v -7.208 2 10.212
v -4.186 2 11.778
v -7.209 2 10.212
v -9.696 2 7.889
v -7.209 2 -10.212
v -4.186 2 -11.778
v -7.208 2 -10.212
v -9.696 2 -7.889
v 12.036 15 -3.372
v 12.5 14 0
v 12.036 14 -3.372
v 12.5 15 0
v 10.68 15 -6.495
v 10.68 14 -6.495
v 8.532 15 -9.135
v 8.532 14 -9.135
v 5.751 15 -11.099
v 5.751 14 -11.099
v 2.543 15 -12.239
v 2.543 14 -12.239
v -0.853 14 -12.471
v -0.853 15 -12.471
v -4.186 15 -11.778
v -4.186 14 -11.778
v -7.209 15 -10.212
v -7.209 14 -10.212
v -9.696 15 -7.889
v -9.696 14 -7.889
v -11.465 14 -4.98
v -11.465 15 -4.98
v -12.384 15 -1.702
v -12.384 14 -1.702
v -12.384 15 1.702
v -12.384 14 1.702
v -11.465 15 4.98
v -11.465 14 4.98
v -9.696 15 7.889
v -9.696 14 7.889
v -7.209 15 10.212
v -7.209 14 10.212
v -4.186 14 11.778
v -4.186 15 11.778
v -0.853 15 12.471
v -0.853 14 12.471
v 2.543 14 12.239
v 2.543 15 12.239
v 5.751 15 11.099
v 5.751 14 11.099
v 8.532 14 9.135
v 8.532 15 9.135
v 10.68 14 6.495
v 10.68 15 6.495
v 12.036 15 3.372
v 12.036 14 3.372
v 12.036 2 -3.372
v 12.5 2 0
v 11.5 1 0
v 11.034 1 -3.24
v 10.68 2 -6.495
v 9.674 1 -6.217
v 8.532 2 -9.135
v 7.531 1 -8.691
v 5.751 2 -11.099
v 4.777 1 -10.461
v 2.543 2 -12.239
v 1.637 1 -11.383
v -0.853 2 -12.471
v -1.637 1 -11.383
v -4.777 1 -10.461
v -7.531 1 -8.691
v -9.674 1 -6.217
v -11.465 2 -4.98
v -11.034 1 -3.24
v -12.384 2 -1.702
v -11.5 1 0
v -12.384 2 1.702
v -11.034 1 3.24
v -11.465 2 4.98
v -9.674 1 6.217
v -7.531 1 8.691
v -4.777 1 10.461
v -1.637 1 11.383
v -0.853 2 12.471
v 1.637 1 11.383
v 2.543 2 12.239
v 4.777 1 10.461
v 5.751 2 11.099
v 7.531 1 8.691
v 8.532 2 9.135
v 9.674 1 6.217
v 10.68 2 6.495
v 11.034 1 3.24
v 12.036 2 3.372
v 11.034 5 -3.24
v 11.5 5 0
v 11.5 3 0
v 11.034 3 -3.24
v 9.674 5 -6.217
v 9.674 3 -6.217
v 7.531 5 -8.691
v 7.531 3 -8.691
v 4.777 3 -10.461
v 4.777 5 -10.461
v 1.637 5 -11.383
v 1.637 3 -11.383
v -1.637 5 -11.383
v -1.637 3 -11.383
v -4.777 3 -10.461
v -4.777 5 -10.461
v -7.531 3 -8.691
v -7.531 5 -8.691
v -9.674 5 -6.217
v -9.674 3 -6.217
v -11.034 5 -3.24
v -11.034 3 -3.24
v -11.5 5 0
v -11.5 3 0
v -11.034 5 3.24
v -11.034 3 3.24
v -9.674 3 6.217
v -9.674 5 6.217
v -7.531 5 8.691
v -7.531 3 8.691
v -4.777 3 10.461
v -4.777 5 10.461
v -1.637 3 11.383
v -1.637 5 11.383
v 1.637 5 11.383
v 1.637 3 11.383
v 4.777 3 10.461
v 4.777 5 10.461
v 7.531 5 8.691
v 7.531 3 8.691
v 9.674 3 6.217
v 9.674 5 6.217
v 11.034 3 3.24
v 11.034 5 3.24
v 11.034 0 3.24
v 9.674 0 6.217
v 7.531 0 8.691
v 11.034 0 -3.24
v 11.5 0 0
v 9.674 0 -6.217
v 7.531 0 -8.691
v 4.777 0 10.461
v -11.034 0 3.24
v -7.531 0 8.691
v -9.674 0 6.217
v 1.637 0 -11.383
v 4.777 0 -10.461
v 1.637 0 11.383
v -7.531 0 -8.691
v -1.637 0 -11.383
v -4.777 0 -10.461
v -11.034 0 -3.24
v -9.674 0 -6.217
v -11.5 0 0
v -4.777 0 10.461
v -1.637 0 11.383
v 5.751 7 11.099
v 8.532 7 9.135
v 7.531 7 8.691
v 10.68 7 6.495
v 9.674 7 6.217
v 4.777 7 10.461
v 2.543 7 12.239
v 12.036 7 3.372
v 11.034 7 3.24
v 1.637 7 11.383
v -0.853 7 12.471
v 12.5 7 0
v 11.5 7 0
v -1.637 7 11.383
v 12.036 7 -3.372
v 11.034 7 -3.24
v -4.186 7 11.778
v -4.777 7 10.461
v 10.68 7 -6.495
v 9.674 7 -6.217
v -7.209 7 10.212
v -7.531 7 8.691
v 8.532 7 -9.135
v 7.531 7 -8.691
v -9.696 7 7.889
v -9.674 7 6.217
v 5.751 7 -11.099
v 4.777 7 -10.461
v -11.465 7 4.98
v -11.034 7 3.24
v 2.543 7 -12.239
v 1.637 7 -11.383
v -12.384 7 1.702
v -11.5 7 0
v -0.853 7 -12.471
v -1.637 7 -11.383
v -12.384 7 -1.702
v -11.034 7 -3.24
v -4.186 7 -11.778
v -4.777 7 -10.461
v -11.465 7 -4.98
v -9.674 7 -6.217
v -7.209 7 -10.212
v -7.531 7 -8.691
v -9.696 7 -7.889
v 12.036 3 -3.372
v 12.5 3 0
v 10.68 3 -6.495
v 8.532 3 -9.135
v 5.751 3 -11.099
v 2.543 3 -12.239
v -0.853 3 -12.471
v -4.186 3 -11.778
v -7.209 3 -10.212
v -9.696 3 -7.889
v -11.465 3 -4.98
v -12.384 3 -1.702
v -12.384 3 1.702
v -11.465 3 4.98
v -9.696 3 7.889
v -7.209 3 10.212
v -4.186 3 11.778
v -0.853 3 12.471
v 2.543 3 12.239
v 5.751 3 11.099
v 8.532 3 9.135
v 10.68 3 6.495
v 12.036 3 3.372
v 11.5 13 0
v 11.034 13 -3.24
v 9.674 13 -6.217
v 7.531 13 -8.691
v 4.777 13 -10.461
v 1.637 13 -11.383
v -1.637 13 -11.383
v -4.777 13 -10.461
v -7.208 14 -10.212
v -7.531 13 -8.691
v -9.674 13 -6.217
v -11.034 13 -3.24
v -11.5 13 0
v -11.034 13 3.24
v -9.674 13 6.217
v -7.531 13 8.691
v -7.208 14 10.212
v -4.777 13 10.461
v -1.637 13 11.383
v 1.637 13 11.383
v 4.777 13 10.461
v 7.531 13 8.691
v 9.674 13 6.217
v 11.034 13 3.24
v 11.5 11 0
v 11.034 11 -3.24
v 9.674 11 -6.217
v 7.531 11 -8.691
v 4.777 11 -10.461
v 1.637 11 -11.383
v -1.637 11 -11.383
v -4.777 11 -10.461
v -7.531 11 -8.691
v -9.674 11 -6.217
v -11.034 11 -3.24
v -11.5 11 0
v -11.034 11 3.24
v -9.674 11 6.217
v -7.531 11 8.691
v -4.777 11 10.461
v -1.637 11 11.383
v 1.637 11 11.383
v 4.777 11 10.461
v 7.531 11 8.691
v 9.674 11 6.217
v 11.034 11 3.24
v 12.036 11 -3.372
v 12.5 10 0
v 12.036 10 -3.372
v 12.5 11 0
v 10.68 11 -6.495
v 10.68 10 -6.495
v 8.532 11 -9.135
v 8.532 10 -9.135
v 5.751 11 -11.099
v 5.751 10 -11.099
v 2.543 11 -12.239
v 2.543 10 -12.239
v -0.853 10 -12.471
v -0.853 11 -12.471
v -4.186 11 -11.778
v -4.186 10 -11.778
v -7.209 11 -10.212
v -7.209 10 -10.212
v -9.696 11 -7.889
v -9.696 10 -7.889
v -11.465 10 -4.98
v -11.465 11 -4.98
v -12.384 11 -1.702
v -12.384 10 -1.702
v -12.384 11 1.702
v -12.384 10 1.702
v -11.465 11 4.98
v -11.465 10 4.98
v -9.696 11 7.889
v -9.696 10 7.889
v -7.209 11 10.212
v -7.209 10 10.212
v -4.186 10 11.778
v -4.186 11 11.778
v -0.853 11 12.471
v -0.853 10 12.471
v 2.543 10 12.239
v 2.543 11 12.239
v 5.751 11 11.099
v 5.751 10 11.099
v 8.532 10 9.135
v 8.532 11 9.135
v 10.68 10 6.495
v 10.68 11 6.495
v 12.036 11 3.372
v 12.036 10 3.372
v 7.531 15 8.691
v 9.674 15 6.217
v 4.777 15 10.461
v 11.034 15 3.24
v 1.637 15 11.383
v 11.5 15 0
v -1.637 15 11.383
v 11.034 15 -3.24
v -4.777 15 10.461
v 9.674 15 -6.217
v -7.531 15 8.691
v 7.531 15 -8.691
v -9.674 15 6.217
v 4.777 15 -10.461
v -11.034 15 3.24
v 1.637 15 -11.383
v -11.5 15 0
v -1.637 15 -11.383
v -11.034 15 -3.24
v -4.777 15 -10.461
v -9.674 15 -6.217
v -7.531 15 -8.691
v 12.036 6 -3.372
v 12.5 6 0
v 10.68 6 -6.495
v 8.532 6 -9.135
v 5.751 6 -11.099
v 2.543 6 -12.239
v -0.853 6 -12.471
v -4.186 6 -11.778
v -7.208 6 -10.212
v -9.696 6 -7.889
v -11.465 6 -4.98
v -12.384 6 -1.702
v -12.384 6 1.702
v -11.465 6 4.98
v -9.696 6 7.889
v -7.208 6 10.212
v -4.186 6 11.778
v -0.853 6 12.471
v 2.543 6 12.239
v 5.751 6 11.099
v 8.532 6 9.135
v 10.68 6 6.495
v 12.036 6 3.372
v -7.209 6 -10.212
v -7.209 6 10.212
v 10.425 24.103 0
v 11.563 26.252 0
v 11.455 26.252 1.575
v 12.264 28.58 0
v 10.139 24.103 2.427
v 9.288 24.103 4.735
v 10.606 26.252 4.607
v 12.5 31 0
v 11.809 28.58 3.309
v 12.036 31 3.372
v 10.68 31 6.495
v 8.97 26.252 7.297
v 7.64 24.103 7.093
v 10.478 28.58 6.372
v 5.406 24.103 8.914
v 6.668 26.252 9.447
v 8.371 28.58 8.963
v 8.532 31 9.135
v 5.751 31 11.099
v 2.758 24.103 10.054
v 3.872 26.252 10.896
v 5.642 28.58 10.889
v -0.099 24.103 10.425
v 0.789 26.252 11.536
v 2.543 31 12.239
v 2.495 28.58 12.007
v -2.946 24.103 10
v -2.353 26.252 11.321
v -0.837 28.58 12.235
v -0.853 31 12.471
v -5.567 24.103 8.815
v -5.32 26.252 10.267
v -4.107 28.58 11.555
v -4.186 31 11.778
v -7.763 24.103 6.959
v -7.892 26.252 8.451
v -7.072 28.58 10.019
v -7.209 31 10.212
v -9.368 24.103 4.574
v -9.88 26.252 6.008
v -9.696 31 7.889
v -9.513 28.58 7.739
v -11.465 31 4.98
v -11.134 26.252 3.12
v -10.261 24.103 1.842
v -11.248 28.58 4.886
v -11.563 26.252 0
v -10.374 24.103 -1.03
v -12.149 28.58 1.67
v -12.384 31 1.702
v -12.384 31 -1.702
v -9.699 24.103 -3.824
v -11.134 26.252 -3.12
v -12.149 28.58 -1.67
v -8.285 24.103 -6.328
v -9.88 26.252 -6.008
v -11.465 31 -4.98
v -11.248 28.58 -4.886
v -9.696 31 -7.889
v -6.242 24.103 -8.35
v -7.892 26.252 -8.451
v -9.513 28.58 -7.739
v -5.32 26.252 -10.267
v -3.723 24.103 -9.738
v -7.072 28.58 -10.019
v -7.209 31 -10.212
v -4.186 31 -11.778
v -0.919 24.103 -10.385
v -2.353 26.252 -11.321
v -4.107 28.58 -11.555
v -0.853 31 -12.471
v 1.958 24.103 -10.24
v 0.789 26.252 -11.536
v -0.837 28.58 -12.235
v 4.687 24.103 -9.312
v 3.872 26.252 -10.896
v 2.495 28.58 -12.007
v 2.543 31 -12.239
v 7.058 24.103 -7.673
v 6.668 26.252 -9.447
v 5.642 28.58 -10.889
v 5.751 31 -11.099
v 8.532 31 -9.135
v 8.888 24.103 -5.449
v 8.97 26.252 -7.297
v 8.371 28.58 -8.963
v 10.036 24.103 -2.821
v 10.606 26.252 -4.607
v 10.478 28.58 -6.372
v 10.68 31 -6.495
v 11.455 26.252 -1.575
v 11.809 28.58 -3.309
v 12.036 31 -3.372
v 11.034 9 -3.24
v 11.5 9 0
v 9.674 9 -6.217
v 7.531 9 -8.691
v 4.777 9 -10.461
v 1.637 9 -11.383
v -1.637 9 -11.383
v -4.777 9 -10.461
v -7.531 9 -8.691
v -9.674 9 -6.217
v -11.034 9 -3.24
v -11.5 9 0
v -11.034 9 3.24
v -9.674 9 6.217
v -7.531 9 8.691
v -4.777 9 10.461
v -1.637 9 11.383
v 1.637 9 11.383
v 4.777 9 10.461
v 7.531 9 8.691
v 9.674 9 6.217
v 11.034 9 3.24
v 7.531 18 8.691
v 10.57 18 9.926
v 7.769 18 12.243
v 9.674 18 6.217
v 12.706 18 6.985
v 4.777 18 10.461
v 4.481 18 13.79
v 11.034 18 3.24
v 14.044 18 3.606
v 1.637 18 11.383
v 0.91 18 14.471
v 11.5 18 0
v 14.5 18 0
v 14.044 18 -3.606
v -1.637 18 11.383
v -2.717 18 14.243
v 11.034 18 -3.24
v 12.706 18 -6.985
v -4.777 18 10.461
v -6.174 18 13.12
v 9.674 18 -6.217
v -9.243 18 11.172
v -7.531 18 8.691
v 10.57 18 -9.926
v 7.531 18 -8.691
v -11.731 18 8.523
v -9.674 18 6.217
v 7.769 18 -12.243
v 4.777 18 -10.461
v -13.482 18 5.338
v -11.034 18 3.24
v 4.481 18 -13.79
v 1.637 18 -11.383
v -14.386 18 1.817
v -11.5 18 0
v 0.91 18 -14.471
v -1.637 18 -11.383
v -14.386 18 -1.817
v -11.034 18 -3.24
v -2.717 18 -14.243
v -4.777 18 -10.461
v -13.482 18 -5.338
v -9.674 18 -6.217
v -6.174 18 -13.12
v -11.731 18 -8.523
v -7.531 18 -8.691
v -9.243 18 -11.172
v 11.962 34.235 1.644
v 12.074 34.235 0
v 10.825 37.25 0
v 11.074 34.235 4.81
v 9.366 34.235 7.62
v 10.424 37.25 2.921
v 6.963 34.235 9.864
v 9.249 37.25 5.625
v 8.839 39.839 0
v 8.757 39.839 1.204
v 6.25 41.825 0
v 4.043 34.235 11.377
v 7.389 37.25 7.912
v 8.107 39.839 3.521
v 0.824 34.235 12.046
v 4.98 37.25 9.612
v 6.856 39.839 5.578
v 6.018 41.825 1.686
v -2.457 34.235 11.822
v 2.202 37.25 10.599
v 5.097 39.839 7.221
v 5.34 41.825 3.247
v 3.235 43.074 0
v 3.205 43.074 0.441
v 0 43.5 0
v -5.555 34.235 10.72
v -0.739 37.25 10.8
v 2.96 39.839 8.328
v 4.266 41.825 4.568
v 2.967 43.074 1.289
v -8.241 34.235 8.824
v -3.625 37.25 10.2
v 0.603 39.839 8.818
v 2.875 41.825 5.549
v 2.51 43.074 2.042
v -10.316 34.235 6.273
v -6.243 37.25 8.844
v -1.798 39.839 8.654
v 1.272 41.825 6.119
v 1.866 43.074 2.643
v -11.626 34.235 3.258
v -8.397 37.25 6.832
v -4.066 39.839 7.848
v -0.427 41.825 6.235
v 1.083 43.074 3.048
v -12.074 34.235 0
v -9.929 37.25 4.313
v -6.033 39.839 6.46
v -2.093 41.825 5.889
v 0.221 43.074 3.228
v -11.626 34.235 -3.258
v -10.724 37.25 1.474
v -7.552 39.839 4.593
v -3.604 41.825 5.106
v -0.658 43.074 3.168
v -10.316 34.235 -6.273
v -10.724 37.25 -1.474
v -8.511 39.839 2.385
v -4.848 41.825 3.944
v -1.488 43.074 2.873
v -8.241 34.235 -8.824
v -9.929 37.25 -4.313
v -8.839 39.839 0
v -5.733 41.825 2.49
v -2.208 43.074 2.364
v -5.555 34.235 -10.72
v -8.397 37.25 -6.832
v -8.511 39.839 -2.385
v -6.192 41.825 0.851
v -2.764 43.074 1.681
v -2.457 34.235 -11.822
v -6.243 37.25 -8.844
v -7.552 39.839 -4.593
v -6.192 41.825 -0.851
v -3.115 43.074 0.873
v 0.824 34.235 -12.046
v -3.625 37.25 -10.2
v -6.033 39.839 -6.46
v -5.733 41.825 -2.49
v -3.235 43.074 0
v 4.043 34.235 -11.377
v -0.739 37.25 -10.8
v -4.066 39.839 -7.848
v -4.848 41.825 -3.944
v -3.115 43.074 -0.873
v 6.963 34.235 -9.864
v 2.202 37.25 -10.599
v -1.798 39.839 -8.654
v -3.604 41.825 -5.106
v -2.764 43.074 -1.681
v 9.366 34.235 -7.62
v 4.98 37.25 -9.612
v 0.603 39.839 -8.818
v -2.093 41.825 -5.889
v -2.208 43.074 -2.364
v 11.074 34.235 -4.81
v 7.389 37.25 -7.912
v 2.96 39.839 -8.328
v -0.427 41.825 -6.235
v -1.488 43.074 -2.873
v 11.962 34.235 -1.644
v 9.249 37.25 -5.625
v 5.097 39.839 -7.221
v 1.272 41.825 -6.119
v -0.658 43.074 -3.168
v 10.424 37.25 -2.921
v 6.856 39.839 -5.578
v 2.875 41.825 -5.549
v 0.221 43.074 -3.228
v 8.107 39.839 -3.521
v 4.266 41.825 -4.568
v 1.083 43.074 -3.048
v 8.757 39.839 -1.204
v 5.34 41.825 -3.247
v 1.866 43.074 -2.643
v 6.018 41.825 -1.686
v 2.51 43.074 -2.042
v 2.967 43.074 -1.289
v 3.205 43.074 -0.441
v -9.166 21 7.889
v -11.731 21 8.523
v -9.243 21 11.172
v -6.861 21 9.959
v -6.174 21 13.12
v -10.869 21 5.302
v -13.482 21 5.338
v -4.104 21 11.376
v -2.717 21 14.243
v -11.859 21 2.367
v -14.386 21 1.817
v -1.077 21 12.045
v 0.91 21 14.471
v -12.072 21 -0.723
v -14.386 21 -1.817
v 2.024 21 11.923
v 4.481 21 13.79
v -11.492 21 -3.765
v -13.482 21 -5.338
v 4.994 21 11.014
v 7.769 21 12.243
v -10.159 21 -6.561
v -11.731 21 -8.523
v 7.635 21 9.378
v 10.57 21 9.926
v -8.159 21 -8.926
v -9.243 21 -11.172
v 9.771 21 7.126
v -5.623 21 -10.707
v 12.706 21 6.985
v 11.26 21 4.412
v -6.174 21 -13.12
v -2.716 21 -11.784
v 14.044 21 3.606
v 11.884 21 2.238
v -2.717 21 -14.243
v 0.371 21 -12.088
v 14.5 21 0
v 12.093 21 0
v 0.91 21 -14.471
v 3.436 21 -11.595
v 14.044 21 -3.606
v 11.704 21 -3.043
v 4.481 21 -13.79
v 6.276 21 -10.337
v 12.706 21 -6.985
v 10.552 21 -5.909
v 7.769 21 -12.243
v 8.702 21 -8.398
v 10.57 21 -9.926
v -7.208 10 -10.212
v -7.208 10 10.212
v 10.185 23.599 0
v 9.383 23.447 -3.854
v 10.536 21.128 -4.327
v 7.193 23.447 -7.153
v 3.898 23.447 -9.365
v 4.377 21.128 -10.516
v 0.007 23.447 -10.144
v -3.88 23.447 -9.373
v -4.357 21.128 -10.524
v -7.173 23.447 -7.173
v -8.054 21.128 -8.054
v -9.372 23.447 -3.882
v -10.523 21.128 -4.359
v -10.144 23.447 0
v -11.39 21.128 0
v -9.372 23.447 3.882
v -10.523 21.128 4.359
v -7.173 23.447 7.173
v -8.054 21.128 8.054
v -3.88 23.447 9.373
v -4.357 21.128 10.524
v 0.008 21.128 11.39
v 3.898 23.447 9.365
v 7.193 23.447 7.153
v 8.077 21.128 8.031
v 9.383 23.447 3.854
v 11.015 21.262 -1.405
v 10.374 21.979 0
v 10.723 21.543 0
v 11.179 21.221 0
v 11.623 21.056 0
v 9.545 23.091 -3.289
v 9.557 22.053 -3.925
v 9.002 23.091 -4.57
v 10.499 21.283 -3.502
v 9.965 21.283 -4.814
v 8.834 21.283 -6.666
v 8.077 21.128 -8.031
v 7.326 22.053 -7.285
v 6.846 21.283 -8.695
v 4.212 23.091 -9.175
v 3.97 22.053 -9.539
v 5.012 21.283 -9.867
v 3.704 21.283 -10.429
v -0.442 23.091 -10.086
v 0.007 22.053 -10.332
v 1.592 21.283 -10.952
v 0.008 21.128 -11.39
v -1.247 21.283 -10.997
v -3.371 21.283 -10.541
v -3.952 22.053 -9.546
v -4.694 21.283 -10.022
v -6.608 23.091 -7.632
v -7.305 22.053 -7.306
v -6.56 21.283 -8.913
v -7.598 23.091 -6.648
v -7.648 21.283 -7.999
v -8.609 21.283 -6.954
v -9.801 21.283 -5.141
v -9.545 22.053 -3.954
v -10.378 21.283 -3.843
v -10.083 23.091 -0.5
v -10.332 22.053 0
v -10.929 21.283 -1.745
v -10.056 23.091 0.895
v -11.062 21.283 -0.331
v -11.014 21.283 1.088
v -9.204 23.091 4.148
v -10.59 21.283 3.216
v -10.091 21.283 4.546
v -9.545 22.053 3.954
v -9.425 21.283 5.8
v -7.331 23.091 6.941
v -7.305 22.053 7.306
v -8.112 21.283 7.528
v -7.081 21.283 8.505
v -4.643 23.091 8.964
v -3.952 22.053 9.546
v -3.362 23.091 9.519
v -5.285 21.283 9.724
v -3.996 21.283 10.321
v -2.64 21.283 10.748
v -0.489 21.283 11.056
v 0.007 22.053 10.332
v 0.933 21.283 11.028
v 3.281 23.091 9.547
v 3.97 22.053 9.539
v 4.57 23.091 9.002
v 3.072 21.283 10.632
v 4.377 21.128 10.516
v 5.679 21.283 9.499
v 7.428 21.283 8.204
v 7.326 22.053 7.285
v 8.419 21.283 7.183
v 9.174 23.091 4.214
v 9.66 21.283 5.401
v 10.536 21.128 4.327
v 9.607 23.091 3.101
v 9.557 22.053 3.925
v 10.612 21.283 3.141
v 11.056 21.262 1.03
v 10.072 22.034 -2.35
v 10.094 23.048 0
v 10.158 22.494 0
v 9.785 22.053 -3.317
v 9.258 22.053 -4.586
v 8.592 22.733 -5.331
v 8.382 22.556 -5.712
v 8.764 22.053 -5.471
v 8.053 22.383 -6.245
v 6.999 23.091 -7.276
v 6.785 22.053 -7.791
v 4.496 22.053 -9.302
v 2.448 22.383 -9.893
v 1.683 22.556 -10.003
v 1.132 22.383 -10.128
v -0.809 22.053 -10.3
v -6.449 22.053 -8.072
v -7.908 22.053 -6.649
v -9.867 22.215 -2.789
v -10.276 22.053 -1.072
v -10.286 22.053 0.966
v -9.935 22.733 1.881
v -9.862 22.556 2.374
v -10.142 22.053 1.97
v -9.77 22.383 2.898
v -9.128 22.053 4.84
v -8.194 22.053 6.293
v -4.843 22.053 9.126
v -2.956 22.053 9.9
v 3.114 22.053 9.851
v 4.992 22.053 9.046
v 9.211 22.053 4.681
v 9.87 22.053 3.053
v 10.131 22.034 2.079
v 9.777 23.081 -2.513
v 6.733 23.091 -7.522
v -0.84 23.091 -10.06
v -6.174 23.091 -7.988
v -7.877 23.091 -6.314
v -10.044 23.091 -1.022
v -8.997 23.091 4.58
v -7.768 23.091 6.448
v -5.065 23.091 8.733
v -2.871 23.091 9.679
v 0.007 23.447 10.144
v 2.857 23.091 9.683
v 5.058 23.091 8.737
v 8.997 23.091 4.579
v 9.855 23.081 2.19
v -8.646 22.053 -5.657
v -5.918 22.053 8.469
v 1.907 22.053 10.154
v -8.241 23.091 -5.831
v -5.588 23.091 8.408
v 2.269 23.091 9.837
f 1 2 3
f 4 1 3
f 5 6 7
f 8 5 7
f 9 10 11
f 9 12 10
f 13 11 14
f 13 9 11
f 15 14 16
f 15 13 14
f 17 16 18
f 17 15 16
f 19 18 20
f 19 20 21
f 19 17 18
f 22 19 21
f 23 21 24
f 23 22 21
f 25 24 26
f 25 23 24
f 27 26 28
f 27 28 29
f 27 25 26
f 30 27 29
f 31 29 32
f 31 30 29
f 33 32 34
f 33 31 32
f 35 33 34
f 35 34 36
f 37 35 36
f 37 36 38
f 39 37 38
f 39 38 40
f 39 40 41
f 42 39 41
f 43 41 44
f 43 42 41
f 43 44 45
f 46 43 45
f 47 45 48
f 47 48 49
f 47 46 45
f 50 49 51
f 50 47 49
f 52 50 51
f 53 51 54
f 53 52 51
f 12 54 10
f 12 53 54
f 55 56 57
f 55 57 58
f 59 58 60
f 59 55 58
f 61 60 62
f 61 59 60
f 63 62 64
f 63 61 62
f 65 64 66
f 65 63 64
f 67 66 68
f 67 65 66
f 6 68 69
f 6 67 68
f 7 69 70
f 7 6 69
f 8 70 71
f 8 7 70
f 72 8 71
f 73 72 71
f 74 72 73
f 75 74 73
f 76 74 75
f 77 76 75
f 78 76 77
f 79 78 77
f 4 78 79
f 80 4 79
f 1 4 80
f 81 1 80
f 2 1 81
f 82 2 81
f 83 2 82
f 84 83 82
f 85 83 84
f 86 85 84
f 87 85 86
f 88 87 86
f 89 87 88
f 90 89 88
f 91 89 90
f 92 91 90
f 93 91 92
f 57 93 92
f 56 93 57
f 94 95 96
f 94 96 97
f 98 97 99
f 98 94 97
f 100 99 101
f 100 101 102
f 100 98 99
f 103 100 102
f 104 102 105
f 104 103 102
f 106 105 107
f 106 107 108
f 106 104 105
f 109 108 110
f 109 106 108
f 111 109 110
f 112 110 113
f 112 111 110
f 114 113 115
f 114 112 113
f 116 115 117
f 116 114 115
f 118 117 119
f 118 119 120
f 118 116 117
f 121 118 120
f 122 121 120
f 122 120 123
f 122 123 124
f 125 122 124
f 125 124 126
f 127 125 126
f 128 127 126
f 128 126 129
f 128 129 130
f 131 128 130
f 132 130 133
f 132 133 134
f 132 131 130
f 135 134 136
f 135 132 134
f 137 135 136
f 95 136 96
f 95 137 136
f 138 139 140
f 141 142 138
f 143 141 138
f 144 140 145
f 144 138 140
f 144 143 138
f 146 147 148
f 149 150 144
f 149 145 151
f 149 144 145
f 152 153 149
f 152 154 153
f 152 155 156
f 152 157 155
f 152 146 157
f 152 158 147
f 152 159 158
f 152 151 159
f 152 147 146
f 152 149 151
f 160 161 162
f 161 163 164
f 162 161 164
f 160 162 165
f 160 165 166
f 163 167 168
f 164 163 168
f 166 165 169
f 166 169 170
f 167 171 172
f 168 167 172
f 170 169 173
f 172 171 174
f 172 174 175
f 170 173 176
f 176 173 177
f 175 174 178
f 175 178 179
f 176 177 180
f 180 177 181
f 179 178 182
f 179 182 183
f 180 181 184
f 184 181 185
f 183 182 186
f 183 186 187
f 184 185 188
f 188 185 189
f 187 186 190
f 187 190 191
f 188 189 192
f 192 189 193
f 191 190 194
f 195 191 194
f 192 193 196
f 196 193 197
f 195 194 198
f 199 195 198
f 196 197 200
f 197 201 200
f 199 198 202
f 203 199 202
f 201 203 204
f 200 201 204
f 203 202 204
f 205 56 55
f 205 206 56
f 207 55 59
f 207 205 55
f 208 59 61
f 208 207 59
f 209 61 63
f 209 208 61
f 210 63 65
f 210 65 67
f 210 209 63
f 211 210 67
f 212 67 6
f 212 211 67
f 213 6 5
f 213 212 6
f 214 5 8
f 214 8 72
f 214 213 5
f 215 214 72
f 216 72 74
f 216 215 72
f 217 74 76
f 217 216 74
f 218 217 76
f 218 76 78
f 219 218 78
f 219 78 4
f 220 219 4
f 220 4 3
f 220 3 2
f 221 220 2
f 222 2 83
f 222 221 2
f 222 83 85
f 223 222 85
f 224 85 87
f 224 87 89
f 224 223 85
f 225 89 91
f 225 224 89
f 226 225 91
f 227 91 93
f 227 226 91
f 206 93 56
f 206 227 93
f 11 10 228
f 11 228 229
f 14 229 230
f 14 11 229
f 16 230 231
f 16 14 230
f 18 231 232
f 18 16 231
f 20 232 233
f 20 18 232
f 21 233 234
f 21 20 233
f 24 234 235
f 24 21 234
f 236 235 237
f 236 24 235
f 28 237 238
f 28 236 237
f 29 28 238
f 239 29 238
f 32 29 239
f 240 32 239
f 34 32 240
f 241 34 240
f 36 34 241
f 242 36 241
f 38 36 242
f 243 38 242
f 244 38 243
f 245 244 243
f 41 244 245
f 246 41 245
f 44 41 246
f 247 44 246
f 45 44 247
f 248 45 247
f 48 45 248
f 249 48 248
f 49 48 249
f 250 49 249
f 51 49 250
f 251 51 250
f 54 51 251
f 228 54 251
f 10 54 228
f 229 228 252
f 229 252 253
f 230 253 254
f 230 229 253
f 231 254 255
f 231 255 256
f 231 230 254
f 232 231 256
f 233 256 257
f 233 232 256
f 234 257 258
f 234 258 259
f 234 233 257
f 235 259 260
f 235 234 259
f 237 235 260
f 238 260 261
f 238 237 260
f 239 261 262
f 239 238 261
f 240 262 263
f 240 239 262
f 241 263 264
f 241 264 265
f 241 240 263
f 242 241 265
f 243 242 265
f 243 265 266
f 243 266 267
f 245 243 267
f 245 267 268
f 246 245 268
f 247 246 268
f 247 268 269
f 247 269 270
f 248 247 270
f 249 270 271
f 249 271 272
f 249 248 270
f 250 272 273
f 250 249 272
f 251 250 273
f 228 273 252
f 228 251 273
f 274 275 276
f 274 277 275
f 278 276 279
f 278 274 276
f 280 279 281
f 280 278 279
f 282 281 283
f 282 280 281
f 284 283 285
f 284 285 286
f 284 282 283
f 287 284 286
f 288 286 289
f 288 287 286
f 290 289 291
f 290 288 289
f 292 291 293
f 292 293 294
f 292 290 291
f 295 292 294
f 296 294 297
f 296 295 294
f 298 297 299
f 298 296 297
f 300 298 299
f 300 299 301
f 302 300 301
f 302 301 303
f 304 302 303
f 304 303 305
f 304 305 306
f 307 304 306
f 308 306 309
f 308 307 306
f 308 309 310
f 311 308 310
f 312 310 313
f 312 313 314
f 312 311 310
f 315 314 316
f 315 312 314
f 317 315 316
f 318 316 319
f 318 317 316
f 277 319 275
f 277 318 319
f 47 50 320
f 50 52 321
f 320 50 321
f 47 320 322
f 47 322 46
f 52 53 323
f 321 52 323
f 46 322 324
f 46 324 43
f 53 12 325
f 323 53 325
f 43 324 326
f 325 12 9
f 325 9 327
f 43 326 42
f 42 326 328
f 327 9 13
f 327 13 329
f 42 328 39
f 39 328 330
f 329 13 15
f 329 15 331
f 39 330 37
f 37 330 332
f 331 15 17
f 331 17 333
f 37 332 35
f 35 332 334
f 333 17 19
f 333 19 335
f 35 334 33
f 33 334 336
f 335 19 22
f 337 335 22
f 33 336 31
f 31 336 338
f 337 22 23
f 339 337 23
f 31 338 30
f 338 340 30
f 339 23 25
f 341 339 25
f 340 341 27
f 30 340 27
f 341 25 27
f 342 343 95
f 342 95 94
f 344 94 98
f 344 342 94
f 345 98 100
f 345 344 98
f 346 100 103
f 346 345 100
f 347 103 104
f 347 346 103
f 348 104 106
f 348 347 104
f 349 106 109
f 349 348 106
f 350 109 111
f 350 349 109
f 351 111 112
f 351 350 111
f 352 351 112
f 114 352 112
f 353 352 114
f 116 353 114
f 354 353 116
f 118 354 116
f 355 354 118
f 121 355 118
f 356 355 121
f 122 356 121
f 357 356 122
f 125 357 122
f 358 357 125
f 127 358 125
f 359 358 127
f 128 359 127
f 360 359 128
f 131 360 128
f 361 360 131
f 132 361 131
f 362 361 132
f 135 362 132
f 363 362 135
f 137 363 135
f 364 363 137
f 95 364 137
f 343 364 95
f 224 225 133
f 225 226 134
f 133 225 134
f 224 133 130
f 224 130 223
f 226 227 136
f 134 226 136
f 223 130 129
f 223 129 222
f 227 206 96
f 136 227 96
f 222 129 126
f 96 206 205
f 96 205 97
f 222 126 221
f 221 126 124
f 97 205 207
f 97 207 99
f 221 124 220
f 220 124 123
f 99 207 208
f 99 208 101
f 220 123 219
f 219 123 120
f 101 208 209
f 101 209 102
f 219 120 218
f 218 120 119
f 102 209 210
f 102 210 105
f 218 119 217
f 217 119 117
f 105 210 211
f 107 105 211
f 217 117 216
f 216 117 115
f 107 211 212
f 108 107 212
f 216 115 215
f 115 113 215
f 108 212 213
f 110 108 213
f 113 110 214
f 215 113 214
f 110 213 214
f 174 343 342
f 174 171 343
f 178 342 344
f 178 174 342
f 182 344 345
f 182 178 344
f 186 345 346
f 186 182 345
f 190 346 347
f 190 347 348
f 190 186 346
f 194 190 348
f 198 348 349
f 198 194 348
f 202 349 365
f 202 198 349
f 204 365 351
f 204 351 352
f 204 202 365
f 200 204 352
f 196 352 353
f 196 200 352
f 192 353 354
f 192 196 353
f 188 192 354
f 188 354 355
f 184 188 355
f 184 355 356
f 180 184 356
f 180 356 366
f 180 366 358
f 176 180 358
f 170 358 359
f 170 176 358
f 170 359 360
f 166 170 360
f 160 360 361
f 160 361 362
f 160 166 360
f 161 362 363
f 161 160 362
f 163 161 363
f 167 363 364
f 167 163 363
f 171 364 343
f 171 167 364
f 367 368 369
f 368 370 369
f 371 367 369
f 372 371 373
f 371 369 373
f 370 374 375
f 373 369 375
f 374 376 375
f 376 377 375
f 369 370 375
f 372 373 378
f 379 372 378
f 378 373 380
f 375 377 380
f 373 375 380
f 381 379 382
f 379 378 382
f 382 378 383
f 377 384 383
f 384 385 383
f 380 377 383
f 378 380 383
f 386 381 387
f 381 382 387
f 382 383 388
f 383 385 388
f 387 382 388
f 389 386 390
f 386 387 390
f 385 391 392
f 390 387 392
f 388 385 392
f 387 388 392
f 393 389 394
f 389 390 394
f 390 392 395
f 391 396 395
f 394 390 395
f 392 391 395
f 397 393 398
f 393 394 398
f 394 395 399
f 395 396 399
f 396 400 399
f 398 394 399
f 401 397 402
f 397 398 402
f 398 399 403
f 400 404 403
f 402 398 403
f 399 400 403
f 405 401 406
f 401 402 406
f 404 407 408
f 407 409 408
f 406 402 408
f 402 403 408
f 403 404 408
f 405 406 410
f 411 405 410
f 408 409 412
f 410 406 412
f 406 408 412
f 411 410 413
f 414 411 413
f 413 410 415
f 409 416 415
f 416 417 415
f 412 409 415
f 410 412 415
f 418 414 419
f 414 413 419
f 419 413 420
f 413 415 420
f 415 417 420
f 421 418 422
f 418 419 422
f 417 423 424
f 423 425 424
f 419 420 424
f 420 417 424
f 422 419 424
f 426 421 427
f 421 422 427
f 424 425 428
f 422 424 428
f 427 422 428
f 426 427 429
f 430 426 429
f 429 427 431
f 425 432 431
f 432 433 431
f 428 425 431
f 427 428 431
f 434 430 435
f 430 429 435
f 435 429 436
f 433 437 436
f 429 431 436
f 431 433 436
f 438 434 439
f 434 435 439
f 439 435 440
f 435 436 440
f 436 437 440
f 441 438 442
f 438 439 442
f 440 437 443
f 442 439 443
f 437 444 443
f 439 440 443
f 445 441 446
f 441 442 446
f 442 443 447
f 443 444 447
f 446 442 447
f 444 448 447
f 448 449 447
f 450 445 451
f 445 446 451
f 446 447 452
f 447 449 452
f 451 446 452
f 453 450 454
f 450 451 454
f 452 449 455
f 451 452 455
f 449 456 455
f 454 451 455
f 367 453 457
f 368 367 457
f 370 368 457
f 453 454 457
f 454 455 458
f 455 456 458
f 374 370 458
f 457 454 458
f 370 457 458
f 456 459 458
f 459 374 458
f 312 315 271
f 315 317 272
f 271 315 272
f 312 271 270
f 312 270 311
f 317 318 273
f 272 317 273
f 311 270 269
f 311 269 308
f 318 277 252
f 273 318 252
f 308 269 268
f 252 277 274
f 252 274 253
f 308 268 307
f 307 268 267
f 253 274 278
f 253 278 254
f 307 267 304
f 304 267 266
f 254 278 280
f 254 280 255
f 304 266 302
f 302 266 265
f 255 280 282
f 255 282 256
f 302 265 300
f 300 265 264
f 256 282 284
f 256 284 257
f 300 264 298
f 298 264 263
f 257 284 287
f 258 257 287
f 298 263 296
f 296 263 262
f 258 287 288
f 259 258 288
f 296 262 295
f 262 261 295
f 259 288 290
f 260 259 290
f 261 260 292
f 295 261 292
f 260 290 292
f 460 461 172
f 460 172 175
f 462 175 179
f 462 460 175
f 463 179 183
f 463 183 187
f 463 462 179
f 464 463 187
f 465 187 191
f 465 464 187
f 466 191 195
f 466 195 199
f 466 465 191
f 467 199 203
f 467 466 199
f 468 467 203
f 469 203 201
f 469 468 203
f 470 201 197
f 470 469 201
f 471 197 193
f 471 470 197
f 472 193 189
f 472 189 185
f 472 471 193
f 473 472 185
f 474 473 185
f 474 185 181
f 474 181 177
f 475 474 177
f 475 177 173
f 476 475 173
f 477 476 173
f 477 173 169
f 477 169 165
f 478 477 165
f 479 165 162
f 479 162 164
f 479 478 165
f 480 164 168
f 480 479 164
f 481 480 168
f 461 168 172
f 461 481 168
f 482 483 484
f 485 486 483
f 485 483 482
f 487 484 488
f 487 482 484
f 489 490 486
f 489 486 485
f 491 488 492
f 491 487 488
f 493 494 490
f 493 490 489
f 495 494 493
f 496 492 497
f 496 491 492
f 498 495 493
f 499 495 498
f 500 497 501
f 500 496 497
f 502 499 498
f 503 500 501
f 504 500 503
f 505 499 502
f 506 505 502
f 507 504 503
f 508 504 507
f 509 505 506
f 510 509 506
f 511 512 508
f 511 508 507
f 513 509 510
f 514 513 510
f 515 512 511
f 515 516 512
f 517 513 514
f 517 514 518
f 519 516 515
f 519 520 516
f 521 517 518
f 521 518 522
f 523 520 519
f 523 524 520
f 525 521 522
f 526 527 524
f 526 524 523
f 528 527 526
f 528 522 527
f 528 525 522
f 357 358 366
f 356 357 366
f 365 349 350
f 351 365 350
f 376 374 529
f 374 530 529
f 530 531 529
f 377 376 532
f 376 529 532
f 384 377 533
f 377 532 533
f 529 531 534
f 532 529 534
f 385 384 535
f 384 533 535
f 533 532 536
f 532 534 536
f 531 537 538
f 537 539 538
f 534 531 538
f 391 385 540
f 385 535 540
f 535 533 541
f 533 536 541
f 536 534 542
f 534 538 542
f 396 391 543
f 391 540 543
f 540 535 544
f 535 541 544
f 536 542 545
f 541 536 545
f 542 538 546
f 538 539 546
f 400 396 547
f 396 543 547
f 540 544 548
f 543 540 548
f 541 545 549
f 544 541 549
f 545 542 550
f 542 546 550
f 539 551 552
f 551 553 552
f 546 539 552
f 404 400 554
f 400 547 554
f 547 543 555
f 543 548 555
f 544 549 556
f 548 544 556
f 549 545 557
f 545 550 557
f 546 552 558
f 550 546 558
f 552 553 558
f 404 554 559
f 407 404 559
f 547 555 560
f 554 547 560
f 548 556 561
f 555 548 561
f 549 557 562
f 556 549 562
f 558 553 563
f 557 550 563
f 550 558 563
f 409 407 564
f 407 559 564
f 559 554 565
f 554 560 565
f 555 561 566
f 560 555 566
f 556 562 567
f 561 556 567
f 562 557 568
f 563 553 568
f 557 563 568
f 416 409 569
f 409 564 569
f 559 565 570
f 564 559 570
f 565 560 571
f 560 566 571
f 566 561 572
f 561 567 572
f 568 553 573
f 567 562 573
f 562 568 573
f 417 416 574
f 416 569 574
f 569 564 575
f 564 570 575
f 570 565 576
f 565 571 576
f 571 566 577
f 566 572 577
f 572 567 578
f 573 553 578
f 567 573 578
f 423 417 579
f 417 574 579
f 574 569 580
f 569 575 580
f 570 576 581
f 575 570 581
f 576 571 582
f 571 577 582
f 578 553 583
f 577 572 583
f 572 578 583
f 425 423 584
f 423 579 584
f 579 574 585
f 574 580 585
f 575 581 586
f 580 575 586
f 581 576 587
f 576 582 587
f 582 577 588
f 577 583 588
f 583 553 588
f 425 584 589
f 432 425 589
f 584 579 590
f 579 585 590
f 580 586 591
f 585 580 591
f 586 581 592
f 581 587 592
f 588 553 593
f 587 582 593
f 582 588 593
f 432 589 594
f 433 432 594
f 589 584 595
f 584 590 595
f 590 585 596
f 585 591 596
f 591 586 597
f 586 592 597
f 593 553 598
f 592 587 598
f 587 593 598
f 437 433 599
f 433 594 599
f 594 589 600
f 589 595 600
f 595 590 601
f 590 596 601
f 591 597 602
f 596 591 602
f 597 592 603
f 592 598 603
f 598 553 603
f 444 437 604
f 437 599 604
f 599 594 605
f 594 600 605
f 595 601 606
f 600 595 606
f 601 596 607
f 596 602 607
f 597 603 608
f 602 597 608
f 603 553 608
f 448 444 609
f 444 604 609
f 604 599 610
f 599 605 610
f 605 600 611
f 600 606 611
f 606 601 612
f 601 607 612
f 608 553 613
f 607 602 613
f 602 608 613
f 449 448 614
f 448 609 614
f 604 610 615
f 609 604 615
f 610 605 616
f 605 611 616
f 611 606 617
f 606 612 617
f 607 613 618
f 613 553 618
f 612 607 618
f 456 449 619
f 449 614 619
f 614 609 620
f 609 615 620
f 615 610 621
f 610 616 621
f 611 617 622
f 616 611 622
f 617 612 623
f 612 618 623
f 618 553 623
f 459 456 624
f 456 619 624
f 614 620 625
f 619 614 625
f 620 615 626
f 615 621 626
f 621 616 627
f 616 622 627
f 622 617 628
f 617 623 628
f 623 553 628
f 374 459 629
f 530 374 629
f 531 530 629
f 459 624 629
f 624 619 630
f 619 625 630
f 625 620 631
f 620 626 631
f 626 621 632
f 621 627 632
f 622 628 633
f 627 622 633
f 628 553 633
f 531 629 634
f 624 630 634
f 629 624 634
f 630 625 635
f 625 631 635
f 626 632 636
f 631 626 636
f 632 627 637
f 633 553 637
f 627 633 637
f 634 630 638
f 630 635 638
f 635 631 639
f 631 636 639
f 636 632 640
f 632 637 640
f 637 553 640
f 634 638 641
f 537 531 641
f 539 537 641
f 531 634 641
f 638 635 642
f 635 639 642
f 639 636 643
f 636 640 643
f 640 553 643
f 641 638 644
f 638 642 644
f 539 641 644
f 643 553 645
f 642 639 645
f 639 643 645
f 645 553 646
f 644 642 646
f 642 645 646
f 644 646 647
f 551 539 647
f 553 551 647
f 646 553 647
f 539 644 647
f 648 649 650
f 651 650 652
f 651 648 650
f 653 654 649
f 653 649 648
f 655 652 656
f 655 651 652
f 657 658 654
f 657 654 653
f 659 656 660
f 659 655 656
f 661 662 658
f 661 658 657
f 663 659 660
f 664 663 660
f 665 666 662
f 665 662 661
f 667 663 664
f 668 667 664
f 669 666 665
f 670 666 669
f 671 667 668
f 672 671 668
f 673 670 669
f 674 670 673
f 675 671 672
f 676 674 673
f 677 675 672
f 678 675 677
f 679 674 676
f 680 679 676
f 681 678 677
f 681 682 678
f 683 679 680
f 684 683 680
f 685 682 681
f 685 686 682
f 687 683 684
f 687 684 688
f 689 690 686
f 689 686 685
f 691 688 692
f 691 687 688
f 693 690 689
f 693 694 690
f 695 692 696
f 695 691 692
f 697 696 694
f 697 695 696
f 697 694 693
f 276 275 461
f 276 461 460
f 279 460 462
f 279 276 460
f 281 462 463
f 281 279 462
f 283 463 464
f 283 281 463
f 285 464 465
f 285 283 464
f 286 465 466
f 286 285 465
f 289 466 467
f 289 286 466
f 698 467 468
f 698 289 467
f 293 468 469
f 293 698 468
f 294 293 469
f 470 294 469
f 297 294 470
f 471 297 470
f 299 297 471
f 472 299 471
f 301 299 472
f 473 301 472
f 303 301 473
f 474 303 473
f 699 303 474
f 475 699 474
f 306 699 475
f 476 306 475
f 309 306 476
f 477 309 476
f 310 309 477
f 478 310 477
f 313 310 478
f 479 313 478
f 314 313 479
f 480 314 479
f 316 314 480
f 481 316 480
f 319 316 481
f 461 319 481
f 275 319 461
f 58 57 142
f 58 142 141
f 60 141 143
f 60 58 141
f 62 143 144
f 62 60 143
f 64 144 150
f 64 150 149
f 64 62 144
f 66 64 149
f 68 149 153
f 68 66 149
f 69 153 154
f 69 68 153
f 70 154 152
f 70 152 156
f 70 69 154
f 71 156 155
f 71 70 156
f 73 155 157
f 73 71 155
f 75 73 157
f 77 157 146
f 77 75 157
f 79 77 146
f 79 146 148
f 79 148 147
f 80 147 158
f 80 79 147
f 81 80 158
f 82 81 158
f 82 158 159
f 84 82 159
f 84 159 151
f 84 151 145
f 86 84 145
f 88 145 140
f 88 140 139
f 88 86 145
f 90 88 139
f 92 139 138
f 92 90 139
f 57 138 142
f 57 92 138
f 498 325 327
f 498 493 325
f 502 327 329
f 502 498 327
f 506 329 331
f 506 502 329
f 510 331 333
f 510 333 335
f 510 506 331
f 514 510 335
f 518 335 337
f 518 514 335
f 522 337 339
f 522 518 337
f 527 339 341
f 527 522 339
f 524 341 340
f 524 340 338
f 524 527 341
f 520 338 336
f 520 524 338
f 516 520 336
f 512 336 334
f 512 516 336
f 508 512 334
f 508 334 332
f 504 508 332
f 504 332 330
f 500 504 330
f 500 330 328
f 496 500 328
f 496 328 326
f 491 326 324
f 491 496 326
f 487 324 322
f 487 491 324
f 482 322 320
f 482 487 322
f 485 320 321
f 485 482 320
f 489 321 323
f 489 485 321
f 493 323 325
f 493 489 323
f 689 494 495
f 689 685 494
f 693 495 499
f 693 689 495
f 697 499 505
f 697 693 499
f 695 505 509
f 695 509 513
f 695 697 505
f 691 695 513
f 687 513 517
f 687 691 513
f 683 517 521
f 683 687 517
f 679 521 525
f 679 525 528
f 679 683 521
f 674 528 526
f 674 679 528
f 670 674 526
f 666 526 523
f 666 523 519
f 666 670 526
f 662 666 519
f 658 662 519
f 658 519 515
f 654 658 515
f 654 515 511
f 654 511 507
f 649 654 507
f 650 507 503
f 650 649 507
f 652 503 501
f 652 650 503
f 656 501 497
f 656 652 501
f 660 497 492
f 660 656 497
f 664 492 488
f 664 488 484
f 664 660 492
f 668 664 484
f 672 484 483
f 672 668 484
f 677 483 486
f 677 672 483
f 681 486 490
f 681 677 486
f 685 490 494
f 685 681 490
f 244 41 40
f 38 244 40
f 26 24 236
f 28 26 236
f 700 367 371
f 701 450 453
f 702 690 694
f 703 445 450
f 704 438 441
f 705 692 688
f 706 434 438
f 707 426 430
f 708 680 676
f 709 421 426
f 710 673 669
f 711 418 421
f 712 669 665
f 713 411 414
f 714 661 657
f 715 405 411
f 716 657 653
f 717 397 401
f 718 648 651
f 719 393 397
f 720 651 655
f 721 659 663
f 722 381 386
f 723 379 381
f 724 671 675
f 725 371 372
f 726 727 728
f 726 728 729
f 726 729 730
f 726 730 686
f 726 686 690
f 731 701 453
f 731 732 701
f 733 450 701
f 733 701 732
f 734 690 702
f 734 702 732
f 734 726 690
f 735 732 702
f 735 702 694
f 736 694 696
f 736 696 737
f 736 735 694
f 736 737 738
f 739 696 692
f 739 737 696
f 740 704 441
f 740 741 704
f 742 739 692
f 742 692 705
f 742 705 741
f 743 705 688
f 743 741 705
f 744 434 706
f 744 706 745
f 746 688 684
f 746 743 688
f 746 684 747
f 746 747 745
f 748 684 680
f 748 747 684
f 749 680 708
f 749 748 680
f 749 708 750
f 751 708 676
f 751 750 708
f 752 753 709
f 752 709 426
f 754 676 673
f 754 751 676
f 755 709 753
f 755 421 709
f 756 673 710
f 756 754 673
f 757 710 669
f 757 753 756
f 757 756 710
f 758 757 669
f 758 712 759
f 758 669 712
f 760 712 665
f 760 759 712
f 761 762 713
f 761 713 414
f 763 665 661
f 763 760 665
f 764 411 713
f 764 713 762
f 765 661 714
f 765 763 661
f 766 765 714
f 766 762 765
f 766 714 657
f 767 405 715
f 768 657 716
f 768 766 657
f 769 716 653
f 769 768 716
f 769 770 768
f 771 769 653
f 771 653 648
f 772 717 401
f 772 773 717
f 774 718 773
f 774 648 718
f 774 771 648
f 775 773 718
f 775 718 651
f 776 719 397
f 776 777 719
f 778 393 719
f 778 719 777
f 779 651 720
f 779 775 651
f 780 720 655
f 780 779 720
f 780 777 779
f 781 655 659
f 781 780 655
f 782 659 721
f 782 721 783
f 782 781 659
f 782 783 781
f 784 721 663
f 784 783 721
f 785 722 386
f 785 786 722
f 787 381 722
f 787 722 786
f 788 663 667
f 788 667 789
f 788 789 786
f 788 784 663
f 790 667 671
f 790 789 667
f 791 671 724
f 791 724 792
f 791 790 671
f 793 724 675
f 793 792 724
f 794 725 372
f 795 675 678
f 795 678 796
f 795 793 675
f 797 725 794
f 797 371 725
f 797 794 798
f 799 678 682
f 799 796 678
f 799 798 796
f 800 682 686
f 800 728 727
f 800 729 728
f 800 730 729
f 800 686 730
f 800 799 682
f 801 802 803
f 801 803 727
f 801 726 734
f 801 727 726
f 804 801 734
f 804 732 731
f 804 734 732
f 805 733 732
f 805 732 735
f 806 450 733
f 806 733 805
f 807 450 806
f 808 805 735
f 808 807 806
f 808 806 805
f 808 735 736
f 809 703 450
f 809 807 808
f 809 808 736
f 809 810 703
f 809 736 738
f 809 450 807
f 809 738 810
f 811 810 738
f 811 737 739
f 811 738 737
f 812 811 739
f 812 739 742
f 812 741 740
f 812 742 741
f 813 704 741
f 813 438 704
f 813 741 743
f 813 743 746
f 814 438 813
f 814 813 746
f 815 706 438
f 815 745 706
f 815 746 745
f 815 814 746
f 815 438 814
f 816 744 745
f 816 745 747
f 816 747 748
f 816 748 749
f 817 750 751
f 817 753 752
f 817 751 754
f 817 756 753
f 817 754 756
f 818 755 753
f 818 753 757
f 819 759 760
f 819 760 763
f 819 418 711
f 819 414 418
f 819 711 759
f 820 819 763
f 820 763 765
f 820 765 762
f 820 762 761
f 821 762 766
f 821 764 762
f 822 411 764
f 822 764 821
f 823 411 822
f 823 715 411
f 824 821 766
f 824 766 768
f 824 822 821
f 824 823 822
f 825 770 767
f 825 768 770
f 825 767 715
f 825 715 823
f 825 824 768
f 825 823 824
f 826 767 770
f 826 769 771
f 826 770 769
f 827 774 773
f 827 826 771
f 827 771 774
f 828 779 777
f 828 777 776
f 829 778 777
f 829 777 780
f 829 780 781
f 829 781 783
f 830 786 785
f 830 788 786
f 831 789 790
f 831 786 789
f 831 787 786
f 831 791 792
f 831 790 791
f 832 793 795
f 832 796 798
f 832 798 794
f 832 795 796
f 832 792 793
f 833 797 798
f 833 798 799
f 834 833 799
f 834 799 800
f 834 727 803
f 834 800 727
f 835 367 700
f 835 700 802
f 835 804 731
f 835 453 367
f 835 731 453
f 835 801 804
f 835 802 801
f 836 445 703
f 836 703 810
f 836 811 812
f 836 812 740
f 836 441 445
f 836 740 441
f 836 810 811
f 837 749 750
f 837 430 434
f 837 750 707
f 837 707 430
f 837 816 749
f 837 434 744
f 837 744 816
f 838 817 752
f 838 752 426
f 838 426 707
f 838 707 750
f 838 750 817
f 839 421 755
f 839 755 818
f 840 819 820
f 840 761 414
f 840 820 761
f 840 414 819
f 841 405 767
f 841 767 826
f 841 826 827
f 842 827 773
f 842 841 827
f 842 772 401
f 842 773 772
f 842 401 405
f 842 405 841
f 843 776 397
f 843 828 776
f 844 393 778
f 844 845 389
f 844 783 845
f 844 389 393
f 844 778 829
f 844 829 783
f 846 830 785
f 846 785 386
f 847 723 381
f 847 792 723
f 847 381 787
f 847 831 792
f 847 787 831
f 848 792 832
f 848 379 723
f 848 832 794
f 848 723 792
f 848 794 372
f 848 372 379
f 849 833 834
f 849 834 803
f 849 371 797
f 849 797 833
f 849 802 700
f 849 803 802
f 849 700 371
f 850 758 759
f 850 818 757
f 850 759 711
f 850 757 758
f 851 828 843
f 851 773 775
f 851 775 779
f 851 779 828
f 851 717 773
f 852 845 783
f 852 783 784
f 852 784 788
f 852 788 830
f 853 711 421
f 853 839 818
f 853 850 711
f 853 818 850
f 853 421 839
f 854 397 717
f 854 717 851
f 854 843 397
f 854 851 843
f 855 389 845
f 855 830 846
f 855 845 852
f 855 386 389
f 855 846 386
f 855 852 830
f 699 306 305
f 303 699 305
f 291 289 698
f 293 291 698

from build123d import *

# Parameters (mm, degrees)
F0_W    = 1
F0_H    = 1
F2_SIZE = 0.99999
F5_R    = 2


# Not quite as in the source:
# - a fillet or chamfer is up to 0.001 mm smaller than in the source, because OpenCascade refuses the exact size


with BuildPart() as f1:
    # F0 (on Top) → F1 (revolve)
    with BuildSketch(Plane.XY):
        Polygon((0, 21), (0, 0), (11.5, 0), (11.5, 2), (11.5, 3), (11.5, 6), (11.5, 7), (11.5, 10), (11.5, 11), (11.5, 14), (11.5, 15), (11.5, 18), (14.5, 18), (14.5, 21), align=None)
        with Locations((12, 14.5)):
            Rectangle(F0_W, F0_H)
        with Locations((12, 10.5)):
            Rectangle(F0_W, F0_H)
        with Locations((12, 6.5)):
            Rectangle(F0_W, F0_H)
        with Locations((12, 2.5)):
            Rectangle(F0_W, F0_H)
    revolve(axis=Axis((0, 10.5, 0), (0, 1, 0)))

    # F2 (size 1 in the source; OpenCascade refuses exactly that, so slightly less here)
    f2_edges = [f1.edges().sort_by_distance(p)[0] for p in [
        (-11.5, 2, 0),
        (-11.5, 6, 0),
        (-11.5, 10, 0),
        (-11.5, 14, 0),
    ]]
    chamfer(f2_edges, length=F2_SIZE)

    # F3 (on Top) → F4 (revolve)
    with BuildSketch(Plane.XY):
        with BuildLine():
            ThreePointArc((0, 18.5), (8.8388347648, 22.1611652352), (12.5, 31))
            ThreePointArc((12.5, 31), (8.8388347648, 39.8388347648), (0, 43.5))
            Line((0, 43.5), (0, 18.5))
        make_face()
    revolve(axis=Axis((0, 31, 0), (0, -1, 0)))

    # F5
    f5_edges = [f1.edges().sort_by_distance(p)[0] for p in [
        (-7.5, 21, 0),
    ]]
    fillet(f5_edges, radius=F5_R)


solid = f1.part
